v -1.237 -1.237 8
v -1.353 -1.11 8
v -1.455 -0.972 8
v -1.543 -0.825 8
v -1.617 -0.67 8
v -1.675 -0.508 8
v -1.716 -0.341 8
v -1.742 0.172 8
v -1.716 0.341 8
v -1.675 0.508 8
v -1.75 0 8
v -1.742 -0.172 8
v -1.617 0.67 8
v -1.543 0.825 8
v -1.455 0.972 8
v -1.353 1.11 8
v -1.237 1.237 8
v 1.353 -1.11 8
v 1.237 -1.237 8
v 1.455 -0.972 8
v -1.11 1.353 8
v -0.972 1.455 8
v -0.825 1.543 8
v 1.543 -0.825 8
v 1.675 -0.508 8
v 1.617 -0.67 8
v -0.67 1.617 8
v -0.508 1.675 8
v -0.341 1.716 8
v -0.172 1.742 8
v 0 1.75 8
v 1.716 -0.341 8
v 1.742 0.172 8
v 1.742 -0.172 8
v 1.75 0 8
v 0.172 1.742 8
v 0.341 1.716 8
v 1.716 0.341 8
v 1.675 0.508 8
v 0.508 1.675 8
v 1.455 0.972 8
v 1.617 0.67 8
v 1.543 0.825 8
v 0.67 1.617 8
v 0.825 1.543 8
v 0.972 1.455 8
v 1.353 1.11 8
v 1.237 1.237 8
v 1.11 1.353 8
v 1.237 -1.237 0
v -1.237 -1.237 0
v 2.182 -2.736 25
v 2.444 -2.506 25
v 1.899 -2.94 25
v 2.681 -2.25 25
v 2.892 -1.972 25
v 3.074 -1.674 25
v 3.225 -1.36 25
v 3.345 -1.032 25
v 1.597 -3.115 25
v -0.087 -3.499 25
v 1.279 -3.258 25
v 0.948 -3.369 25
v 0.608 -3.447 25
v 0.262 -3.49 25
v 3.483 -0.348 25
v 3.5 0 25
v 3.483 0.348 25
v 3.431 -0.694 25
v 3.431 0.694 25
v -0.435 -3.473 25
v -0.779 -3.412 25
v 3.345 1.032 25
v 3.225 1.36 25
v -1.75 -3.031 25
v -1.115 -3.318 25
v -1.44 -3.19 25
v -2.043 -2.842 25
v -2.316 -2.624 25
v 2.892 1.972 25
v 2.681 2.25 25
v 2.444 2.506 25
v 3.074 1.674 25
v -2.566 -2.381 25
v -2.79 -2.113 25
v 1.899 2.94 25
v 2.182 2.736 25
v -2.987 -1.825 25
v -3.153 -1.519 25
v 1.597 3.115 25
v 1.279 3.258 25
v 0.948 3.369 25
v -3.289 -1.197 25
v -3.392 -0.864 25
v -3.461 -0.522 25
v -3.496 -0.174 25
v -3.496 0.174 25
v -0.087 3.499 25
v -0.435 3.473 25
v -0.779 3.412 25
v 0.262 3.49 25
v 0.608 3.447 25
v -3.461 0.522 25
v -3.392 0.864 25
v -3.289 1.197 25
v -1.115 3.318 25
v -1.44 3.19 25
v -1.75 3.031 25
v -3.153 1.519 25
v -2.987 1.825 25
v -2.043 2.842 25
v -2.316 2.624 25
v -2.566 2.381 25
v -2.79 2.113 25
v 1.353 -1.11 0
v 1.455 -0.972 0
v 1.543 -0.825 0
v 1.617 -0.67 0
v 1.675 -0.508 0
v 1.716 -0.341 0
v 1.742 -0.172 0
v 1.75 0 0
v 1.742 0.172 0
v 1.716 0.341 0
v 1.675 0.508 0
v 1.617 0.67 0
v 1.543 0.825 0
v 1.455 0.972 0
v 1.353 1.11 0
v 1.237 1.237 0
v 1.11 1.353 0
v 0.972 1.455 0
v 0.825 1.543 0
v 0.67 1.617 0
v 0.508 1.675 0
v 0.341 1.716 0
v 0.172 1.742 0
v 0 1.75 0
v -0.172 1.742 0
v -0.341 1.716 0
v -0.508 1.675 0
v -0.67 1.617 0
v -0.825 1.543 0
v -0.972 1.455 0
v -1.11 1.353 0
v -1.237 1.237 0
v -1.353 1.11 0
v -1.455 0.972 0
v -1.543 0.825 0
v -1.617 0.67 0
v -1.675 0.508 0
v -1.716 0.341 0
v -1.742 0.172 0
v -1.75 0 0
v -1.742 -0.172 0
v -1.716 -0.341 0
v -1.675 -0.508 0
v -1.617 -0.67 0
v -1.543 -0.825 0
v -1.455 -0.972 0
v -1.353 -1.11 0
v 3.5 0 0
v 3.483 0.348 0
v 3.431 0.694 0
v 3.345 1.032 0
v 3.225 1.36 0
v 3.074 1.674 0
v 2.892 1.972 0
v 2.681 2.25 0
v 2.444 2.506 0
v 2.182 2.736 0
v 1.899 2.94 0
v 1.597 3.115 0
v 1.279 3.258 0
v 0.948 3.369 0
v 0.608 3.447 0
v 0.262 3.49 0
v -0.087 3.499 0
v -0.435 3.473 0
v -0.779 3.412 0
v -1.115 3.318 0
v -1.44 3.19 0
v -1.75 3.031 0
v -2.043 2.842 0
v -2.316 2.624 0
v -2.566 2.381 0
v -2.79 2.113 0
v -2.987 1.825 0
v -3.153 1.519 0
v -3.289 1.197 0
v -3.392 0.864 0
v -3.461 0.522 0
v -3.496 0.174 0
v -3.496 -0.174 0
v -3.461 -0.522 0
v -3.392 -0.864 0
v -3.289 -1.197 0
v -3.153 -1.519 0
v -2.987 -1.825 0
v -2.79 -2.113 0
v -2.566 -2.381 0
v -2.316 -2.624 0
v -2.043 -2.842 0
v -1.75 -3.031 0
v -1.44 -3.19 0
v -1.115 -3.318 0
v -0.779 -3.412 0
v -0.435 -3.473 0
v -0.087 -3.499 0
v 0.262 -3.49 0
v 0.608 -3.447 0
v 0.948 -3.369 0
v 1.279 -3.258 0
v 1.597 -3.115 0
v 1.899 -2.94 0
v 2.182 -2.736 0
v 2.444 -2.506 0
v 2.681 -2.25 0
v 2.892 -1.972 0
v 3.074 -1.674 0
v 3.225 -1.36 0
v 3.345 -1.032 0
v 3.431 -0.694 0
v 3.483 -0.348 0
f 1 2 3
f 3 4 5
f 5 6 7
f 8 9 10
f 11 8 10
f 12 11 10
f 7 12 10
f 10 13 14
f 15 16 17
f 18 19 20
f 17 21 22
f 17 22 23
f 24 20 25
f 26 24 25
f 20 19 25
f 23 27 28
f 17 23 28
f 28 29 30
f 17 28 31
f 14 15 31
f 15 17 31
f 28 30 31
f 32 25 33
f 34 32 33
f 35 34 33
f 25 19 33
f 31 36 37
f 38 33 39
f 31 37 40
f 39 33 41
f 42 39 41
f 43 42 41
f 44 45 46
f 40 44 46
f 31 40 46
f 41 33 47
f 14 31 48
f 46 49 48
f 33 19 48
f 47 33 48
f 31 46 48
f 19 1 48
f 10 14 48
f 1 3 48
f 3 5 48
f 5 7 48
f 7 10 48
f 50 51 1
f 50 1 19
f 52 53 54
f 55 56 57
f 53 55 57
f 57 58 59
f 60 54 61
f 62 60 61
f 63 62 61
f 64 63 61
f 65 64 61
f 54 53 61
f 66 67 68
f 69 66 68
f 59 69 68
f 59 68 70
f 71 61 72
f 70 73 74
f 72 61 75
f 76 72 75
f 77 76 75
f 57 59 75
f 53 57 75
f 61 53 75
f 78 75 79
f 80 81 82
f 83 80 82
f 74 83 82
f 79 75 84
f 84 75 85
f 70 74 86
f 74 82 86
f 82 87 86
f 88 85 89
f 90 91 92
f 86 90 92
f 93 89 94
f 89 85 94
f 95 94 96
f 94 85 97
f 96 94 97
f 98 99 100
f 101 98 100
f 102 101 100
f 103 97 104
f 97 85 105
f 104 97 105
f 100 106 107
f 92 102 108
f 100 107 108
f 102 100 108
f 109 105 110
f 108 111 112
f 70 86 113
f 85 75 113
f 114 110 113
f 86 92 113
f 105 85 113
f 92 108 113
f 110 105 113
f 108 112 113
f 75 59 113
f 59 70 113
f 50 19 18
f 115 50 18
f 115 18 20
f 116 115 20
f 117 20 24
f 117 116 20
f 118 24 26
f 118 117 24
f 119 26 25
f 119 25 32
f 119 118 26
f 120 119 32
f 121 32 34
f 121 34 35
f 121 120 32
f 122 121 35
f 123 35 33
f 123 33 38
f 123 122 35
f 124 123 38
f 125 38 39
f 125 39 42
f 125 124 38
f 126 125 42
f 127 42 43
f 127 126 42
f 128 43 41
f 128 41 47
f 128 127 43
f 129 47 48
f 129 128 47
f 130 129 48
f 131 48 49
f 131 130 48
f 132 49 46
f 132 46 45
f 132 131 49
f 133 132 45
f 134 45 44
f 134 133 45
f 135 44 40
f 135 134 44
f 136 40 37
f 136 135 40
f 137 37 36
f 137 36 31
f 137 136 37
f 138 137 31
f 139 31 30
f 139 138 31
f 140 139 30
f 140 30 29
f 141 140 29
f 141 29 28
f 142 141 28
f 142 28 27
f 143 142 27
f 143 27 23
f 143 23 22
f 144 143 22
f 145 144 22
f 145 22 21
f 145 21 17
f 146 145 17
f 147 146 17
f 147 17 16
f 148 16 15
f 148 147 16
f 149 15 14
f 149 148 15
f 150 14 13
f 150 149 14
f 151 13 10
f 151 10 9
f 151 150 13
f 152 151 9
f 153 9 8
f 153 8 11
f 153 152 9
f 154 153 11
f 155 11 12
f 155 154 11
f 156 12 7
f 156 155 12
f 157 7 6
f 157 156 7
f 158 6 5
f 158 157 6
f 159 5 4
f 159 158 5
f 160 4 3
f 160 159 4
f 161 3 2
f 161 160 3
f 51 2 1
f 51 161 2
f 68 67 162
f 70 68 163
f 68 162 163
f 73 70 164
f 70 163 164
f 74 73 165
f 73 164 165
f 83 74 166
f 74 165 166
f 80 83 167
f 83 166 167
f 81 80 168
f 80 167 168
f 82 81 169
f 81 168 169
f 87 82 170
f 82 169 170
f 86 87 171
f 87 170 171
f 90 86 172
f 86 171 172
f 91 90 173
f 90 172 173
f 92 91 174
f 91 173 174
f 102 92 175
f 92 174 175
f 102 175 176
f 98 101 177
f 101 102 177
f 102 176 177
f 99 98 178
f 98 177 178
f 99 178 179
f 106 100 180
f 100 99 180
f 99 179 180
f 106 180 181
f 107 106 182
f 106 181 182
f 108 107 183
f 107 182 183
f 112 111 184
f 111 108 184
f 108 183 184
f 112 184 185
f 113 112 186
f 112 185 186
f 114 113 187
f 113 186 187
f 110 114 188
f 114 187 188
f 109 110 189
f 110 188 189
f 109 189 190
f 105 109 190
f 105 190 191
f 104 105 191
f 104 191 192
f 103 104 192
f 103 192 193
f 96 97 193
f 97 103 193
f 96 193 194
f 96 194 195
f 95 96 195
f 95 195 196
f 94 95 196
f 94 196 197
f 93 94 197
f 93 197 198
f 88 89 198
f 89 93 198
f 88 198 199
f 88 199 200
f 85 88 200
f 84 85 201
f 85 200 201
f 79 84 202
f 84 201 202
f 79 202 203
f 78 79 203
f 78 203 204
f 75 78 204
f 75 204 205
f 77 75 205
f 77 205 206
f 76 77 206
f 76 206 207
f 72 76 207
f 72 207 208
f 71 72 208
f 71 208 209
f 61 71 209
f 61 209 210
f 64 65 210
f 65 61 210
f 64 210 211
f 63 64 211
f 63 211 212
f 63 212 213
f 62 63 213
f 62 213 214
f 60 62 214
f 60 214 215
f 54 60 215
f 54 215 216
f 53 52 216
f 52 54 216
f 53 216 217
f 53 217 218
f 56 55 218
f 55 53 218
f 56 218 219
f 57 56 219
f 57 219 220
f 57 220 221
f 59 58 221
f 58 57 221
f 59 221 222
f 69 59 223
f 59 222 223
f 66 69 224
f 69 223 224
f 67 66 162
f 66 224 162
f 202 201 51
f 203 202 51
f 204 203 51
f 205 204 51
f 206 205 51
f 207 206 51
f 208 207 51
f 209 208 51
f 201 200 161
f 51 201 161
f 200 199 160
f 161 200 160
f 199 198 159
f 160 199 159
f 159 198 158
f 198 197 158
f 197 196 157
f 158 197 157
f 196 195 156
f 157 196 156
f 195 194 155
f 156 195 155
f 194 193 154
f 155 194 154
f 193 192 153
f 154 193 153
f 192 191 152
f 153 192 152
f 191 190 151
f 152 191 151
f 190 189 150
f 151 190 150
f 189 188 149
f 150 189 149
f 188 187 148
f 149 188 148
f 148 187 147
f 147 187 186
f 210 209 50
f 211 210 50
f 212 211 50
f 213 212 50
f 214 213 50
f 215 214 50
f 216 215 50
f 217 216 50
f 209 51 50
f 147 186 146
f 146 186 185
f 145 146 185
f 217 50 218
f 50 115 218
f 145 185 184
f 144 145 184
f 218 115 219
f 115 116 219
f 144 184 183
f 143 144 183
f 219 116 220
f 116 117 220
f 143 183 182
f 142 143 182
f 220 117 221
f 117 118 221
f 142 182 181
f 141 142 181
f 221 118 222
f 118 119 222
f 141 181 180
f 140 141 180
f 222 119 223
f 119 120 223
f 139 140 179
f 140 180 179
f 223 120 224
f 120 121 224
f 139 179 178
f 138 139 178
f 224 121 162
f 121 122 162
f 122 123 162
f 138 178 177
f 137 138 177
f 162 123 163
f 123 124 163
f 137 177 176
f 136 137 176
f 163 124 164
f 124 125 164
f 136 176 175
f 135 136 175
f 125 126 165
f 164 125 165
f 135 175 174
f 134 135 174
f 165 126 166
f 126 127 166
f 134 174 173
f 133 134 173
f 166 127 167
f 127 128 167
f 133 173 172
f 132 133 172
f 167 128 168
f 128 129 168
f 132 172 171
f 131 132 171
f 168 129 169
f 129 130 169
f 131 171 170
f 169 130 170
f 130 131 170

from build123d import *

# Parameters (mm, degrees)
SKETCH2_R           = 3.5
BOSS_EXTRUDE1_DEPTH = 8
SKETCH3_R           = 3.5
BOSS_EXTRUDE2_DEPTH = 18
SKETCH4_W           = 12.5
SKETCH4_H           = 8
SKETCH4_W_2         = 8.5
SKETCH4_H_2         = 4
BOSS_EXTRUDE3_DEPTH = 10
SKETCH5_W           = 12.5
SKETCH5_H           = 8
BOSS_EXTRUDE4_DEPTH = 1
FILLET2_R           = 2
SKETCH6_W           = 15.377134156
SKETCH6_H           = 9.300468084
CUT_EXTRUDE1_DEPTH  = 12


with BuildPart() as part:
    # Sketch2 → Boss-Extrude1 (new body)
    with BuildSketch(Plane.XY):
        Circle(SKETCH2_R)
        with BuildLine():
            Line((-1.237436867, -1.237436867), (1.237436867, -1.237436867))
            ThreePointArc((1.237436867, -1.237436867), (0, 1.75), (-1.237436867, -1.237436867))
        make_face(mode=Mode.SUBTRACT)
    extrude(amount=BOSS_EXTRUDE1_DEPTH)

    # Sketch3 → Boss-Extrude2 (add)
    with BuildSketch(Plane.XY.offset(8)):
        Circle(SKETCH3_R)
    extrude(amount=BOSS_EXTRUDE2_DEPTH)

    # Sketch4 → Boss-Extrude3 (add)
    with BuildSketch(Plane.XY.offset(26)):
        Rectangle(SKETCH4_W, SKETCH4_H)
        Rectangle(SKETCH4_W_2, SKETCH4_H_2, mode=Mode.SUBTRACT)
    extrude(amount=BOSS_EXTRUDE3_DEPTH)

    # Sketch5 → Boss-Extrude4 (add)
    with BuildSketch(Plane(origin=(0, 0, 26), x_dir=(-1, 0, 0), z_dir=(0, 0, -1))):
        Rectangle(SKETCH5_W, SKETCH5_H)
    extrude(amount=BOSS_EXTRUDE4_DEPTH)

    # Fillet2
    fillet2_edges = [part.edges().sort_by_distance(p)[0] for p in [
        (-6.25, -4, 30.5),
        (6.25, -4, 30.5),
        (6.25, 4, 30.5),
        (-6.25, 4, 30.5),
    ]]
    fillet(fillet2_edges, radius=FILLET2_R)

    # Sketch6 → Cut-Extrude1 (cut, through all)
    with BuildSketch(Plane(origin=(0, 0, 25), x_dir=(-1, 0, 0), z_dir=(0, 0, -1))):
        with Locations((-0.478823703, -0.270525698)):
            Rectangle(SKETCH6_W, SKETCH6_H)
    extrude(amount=-CUT_EXTRUDE1_DEPTH, mode=Mode.SUBTRACT)


solid = part.part
